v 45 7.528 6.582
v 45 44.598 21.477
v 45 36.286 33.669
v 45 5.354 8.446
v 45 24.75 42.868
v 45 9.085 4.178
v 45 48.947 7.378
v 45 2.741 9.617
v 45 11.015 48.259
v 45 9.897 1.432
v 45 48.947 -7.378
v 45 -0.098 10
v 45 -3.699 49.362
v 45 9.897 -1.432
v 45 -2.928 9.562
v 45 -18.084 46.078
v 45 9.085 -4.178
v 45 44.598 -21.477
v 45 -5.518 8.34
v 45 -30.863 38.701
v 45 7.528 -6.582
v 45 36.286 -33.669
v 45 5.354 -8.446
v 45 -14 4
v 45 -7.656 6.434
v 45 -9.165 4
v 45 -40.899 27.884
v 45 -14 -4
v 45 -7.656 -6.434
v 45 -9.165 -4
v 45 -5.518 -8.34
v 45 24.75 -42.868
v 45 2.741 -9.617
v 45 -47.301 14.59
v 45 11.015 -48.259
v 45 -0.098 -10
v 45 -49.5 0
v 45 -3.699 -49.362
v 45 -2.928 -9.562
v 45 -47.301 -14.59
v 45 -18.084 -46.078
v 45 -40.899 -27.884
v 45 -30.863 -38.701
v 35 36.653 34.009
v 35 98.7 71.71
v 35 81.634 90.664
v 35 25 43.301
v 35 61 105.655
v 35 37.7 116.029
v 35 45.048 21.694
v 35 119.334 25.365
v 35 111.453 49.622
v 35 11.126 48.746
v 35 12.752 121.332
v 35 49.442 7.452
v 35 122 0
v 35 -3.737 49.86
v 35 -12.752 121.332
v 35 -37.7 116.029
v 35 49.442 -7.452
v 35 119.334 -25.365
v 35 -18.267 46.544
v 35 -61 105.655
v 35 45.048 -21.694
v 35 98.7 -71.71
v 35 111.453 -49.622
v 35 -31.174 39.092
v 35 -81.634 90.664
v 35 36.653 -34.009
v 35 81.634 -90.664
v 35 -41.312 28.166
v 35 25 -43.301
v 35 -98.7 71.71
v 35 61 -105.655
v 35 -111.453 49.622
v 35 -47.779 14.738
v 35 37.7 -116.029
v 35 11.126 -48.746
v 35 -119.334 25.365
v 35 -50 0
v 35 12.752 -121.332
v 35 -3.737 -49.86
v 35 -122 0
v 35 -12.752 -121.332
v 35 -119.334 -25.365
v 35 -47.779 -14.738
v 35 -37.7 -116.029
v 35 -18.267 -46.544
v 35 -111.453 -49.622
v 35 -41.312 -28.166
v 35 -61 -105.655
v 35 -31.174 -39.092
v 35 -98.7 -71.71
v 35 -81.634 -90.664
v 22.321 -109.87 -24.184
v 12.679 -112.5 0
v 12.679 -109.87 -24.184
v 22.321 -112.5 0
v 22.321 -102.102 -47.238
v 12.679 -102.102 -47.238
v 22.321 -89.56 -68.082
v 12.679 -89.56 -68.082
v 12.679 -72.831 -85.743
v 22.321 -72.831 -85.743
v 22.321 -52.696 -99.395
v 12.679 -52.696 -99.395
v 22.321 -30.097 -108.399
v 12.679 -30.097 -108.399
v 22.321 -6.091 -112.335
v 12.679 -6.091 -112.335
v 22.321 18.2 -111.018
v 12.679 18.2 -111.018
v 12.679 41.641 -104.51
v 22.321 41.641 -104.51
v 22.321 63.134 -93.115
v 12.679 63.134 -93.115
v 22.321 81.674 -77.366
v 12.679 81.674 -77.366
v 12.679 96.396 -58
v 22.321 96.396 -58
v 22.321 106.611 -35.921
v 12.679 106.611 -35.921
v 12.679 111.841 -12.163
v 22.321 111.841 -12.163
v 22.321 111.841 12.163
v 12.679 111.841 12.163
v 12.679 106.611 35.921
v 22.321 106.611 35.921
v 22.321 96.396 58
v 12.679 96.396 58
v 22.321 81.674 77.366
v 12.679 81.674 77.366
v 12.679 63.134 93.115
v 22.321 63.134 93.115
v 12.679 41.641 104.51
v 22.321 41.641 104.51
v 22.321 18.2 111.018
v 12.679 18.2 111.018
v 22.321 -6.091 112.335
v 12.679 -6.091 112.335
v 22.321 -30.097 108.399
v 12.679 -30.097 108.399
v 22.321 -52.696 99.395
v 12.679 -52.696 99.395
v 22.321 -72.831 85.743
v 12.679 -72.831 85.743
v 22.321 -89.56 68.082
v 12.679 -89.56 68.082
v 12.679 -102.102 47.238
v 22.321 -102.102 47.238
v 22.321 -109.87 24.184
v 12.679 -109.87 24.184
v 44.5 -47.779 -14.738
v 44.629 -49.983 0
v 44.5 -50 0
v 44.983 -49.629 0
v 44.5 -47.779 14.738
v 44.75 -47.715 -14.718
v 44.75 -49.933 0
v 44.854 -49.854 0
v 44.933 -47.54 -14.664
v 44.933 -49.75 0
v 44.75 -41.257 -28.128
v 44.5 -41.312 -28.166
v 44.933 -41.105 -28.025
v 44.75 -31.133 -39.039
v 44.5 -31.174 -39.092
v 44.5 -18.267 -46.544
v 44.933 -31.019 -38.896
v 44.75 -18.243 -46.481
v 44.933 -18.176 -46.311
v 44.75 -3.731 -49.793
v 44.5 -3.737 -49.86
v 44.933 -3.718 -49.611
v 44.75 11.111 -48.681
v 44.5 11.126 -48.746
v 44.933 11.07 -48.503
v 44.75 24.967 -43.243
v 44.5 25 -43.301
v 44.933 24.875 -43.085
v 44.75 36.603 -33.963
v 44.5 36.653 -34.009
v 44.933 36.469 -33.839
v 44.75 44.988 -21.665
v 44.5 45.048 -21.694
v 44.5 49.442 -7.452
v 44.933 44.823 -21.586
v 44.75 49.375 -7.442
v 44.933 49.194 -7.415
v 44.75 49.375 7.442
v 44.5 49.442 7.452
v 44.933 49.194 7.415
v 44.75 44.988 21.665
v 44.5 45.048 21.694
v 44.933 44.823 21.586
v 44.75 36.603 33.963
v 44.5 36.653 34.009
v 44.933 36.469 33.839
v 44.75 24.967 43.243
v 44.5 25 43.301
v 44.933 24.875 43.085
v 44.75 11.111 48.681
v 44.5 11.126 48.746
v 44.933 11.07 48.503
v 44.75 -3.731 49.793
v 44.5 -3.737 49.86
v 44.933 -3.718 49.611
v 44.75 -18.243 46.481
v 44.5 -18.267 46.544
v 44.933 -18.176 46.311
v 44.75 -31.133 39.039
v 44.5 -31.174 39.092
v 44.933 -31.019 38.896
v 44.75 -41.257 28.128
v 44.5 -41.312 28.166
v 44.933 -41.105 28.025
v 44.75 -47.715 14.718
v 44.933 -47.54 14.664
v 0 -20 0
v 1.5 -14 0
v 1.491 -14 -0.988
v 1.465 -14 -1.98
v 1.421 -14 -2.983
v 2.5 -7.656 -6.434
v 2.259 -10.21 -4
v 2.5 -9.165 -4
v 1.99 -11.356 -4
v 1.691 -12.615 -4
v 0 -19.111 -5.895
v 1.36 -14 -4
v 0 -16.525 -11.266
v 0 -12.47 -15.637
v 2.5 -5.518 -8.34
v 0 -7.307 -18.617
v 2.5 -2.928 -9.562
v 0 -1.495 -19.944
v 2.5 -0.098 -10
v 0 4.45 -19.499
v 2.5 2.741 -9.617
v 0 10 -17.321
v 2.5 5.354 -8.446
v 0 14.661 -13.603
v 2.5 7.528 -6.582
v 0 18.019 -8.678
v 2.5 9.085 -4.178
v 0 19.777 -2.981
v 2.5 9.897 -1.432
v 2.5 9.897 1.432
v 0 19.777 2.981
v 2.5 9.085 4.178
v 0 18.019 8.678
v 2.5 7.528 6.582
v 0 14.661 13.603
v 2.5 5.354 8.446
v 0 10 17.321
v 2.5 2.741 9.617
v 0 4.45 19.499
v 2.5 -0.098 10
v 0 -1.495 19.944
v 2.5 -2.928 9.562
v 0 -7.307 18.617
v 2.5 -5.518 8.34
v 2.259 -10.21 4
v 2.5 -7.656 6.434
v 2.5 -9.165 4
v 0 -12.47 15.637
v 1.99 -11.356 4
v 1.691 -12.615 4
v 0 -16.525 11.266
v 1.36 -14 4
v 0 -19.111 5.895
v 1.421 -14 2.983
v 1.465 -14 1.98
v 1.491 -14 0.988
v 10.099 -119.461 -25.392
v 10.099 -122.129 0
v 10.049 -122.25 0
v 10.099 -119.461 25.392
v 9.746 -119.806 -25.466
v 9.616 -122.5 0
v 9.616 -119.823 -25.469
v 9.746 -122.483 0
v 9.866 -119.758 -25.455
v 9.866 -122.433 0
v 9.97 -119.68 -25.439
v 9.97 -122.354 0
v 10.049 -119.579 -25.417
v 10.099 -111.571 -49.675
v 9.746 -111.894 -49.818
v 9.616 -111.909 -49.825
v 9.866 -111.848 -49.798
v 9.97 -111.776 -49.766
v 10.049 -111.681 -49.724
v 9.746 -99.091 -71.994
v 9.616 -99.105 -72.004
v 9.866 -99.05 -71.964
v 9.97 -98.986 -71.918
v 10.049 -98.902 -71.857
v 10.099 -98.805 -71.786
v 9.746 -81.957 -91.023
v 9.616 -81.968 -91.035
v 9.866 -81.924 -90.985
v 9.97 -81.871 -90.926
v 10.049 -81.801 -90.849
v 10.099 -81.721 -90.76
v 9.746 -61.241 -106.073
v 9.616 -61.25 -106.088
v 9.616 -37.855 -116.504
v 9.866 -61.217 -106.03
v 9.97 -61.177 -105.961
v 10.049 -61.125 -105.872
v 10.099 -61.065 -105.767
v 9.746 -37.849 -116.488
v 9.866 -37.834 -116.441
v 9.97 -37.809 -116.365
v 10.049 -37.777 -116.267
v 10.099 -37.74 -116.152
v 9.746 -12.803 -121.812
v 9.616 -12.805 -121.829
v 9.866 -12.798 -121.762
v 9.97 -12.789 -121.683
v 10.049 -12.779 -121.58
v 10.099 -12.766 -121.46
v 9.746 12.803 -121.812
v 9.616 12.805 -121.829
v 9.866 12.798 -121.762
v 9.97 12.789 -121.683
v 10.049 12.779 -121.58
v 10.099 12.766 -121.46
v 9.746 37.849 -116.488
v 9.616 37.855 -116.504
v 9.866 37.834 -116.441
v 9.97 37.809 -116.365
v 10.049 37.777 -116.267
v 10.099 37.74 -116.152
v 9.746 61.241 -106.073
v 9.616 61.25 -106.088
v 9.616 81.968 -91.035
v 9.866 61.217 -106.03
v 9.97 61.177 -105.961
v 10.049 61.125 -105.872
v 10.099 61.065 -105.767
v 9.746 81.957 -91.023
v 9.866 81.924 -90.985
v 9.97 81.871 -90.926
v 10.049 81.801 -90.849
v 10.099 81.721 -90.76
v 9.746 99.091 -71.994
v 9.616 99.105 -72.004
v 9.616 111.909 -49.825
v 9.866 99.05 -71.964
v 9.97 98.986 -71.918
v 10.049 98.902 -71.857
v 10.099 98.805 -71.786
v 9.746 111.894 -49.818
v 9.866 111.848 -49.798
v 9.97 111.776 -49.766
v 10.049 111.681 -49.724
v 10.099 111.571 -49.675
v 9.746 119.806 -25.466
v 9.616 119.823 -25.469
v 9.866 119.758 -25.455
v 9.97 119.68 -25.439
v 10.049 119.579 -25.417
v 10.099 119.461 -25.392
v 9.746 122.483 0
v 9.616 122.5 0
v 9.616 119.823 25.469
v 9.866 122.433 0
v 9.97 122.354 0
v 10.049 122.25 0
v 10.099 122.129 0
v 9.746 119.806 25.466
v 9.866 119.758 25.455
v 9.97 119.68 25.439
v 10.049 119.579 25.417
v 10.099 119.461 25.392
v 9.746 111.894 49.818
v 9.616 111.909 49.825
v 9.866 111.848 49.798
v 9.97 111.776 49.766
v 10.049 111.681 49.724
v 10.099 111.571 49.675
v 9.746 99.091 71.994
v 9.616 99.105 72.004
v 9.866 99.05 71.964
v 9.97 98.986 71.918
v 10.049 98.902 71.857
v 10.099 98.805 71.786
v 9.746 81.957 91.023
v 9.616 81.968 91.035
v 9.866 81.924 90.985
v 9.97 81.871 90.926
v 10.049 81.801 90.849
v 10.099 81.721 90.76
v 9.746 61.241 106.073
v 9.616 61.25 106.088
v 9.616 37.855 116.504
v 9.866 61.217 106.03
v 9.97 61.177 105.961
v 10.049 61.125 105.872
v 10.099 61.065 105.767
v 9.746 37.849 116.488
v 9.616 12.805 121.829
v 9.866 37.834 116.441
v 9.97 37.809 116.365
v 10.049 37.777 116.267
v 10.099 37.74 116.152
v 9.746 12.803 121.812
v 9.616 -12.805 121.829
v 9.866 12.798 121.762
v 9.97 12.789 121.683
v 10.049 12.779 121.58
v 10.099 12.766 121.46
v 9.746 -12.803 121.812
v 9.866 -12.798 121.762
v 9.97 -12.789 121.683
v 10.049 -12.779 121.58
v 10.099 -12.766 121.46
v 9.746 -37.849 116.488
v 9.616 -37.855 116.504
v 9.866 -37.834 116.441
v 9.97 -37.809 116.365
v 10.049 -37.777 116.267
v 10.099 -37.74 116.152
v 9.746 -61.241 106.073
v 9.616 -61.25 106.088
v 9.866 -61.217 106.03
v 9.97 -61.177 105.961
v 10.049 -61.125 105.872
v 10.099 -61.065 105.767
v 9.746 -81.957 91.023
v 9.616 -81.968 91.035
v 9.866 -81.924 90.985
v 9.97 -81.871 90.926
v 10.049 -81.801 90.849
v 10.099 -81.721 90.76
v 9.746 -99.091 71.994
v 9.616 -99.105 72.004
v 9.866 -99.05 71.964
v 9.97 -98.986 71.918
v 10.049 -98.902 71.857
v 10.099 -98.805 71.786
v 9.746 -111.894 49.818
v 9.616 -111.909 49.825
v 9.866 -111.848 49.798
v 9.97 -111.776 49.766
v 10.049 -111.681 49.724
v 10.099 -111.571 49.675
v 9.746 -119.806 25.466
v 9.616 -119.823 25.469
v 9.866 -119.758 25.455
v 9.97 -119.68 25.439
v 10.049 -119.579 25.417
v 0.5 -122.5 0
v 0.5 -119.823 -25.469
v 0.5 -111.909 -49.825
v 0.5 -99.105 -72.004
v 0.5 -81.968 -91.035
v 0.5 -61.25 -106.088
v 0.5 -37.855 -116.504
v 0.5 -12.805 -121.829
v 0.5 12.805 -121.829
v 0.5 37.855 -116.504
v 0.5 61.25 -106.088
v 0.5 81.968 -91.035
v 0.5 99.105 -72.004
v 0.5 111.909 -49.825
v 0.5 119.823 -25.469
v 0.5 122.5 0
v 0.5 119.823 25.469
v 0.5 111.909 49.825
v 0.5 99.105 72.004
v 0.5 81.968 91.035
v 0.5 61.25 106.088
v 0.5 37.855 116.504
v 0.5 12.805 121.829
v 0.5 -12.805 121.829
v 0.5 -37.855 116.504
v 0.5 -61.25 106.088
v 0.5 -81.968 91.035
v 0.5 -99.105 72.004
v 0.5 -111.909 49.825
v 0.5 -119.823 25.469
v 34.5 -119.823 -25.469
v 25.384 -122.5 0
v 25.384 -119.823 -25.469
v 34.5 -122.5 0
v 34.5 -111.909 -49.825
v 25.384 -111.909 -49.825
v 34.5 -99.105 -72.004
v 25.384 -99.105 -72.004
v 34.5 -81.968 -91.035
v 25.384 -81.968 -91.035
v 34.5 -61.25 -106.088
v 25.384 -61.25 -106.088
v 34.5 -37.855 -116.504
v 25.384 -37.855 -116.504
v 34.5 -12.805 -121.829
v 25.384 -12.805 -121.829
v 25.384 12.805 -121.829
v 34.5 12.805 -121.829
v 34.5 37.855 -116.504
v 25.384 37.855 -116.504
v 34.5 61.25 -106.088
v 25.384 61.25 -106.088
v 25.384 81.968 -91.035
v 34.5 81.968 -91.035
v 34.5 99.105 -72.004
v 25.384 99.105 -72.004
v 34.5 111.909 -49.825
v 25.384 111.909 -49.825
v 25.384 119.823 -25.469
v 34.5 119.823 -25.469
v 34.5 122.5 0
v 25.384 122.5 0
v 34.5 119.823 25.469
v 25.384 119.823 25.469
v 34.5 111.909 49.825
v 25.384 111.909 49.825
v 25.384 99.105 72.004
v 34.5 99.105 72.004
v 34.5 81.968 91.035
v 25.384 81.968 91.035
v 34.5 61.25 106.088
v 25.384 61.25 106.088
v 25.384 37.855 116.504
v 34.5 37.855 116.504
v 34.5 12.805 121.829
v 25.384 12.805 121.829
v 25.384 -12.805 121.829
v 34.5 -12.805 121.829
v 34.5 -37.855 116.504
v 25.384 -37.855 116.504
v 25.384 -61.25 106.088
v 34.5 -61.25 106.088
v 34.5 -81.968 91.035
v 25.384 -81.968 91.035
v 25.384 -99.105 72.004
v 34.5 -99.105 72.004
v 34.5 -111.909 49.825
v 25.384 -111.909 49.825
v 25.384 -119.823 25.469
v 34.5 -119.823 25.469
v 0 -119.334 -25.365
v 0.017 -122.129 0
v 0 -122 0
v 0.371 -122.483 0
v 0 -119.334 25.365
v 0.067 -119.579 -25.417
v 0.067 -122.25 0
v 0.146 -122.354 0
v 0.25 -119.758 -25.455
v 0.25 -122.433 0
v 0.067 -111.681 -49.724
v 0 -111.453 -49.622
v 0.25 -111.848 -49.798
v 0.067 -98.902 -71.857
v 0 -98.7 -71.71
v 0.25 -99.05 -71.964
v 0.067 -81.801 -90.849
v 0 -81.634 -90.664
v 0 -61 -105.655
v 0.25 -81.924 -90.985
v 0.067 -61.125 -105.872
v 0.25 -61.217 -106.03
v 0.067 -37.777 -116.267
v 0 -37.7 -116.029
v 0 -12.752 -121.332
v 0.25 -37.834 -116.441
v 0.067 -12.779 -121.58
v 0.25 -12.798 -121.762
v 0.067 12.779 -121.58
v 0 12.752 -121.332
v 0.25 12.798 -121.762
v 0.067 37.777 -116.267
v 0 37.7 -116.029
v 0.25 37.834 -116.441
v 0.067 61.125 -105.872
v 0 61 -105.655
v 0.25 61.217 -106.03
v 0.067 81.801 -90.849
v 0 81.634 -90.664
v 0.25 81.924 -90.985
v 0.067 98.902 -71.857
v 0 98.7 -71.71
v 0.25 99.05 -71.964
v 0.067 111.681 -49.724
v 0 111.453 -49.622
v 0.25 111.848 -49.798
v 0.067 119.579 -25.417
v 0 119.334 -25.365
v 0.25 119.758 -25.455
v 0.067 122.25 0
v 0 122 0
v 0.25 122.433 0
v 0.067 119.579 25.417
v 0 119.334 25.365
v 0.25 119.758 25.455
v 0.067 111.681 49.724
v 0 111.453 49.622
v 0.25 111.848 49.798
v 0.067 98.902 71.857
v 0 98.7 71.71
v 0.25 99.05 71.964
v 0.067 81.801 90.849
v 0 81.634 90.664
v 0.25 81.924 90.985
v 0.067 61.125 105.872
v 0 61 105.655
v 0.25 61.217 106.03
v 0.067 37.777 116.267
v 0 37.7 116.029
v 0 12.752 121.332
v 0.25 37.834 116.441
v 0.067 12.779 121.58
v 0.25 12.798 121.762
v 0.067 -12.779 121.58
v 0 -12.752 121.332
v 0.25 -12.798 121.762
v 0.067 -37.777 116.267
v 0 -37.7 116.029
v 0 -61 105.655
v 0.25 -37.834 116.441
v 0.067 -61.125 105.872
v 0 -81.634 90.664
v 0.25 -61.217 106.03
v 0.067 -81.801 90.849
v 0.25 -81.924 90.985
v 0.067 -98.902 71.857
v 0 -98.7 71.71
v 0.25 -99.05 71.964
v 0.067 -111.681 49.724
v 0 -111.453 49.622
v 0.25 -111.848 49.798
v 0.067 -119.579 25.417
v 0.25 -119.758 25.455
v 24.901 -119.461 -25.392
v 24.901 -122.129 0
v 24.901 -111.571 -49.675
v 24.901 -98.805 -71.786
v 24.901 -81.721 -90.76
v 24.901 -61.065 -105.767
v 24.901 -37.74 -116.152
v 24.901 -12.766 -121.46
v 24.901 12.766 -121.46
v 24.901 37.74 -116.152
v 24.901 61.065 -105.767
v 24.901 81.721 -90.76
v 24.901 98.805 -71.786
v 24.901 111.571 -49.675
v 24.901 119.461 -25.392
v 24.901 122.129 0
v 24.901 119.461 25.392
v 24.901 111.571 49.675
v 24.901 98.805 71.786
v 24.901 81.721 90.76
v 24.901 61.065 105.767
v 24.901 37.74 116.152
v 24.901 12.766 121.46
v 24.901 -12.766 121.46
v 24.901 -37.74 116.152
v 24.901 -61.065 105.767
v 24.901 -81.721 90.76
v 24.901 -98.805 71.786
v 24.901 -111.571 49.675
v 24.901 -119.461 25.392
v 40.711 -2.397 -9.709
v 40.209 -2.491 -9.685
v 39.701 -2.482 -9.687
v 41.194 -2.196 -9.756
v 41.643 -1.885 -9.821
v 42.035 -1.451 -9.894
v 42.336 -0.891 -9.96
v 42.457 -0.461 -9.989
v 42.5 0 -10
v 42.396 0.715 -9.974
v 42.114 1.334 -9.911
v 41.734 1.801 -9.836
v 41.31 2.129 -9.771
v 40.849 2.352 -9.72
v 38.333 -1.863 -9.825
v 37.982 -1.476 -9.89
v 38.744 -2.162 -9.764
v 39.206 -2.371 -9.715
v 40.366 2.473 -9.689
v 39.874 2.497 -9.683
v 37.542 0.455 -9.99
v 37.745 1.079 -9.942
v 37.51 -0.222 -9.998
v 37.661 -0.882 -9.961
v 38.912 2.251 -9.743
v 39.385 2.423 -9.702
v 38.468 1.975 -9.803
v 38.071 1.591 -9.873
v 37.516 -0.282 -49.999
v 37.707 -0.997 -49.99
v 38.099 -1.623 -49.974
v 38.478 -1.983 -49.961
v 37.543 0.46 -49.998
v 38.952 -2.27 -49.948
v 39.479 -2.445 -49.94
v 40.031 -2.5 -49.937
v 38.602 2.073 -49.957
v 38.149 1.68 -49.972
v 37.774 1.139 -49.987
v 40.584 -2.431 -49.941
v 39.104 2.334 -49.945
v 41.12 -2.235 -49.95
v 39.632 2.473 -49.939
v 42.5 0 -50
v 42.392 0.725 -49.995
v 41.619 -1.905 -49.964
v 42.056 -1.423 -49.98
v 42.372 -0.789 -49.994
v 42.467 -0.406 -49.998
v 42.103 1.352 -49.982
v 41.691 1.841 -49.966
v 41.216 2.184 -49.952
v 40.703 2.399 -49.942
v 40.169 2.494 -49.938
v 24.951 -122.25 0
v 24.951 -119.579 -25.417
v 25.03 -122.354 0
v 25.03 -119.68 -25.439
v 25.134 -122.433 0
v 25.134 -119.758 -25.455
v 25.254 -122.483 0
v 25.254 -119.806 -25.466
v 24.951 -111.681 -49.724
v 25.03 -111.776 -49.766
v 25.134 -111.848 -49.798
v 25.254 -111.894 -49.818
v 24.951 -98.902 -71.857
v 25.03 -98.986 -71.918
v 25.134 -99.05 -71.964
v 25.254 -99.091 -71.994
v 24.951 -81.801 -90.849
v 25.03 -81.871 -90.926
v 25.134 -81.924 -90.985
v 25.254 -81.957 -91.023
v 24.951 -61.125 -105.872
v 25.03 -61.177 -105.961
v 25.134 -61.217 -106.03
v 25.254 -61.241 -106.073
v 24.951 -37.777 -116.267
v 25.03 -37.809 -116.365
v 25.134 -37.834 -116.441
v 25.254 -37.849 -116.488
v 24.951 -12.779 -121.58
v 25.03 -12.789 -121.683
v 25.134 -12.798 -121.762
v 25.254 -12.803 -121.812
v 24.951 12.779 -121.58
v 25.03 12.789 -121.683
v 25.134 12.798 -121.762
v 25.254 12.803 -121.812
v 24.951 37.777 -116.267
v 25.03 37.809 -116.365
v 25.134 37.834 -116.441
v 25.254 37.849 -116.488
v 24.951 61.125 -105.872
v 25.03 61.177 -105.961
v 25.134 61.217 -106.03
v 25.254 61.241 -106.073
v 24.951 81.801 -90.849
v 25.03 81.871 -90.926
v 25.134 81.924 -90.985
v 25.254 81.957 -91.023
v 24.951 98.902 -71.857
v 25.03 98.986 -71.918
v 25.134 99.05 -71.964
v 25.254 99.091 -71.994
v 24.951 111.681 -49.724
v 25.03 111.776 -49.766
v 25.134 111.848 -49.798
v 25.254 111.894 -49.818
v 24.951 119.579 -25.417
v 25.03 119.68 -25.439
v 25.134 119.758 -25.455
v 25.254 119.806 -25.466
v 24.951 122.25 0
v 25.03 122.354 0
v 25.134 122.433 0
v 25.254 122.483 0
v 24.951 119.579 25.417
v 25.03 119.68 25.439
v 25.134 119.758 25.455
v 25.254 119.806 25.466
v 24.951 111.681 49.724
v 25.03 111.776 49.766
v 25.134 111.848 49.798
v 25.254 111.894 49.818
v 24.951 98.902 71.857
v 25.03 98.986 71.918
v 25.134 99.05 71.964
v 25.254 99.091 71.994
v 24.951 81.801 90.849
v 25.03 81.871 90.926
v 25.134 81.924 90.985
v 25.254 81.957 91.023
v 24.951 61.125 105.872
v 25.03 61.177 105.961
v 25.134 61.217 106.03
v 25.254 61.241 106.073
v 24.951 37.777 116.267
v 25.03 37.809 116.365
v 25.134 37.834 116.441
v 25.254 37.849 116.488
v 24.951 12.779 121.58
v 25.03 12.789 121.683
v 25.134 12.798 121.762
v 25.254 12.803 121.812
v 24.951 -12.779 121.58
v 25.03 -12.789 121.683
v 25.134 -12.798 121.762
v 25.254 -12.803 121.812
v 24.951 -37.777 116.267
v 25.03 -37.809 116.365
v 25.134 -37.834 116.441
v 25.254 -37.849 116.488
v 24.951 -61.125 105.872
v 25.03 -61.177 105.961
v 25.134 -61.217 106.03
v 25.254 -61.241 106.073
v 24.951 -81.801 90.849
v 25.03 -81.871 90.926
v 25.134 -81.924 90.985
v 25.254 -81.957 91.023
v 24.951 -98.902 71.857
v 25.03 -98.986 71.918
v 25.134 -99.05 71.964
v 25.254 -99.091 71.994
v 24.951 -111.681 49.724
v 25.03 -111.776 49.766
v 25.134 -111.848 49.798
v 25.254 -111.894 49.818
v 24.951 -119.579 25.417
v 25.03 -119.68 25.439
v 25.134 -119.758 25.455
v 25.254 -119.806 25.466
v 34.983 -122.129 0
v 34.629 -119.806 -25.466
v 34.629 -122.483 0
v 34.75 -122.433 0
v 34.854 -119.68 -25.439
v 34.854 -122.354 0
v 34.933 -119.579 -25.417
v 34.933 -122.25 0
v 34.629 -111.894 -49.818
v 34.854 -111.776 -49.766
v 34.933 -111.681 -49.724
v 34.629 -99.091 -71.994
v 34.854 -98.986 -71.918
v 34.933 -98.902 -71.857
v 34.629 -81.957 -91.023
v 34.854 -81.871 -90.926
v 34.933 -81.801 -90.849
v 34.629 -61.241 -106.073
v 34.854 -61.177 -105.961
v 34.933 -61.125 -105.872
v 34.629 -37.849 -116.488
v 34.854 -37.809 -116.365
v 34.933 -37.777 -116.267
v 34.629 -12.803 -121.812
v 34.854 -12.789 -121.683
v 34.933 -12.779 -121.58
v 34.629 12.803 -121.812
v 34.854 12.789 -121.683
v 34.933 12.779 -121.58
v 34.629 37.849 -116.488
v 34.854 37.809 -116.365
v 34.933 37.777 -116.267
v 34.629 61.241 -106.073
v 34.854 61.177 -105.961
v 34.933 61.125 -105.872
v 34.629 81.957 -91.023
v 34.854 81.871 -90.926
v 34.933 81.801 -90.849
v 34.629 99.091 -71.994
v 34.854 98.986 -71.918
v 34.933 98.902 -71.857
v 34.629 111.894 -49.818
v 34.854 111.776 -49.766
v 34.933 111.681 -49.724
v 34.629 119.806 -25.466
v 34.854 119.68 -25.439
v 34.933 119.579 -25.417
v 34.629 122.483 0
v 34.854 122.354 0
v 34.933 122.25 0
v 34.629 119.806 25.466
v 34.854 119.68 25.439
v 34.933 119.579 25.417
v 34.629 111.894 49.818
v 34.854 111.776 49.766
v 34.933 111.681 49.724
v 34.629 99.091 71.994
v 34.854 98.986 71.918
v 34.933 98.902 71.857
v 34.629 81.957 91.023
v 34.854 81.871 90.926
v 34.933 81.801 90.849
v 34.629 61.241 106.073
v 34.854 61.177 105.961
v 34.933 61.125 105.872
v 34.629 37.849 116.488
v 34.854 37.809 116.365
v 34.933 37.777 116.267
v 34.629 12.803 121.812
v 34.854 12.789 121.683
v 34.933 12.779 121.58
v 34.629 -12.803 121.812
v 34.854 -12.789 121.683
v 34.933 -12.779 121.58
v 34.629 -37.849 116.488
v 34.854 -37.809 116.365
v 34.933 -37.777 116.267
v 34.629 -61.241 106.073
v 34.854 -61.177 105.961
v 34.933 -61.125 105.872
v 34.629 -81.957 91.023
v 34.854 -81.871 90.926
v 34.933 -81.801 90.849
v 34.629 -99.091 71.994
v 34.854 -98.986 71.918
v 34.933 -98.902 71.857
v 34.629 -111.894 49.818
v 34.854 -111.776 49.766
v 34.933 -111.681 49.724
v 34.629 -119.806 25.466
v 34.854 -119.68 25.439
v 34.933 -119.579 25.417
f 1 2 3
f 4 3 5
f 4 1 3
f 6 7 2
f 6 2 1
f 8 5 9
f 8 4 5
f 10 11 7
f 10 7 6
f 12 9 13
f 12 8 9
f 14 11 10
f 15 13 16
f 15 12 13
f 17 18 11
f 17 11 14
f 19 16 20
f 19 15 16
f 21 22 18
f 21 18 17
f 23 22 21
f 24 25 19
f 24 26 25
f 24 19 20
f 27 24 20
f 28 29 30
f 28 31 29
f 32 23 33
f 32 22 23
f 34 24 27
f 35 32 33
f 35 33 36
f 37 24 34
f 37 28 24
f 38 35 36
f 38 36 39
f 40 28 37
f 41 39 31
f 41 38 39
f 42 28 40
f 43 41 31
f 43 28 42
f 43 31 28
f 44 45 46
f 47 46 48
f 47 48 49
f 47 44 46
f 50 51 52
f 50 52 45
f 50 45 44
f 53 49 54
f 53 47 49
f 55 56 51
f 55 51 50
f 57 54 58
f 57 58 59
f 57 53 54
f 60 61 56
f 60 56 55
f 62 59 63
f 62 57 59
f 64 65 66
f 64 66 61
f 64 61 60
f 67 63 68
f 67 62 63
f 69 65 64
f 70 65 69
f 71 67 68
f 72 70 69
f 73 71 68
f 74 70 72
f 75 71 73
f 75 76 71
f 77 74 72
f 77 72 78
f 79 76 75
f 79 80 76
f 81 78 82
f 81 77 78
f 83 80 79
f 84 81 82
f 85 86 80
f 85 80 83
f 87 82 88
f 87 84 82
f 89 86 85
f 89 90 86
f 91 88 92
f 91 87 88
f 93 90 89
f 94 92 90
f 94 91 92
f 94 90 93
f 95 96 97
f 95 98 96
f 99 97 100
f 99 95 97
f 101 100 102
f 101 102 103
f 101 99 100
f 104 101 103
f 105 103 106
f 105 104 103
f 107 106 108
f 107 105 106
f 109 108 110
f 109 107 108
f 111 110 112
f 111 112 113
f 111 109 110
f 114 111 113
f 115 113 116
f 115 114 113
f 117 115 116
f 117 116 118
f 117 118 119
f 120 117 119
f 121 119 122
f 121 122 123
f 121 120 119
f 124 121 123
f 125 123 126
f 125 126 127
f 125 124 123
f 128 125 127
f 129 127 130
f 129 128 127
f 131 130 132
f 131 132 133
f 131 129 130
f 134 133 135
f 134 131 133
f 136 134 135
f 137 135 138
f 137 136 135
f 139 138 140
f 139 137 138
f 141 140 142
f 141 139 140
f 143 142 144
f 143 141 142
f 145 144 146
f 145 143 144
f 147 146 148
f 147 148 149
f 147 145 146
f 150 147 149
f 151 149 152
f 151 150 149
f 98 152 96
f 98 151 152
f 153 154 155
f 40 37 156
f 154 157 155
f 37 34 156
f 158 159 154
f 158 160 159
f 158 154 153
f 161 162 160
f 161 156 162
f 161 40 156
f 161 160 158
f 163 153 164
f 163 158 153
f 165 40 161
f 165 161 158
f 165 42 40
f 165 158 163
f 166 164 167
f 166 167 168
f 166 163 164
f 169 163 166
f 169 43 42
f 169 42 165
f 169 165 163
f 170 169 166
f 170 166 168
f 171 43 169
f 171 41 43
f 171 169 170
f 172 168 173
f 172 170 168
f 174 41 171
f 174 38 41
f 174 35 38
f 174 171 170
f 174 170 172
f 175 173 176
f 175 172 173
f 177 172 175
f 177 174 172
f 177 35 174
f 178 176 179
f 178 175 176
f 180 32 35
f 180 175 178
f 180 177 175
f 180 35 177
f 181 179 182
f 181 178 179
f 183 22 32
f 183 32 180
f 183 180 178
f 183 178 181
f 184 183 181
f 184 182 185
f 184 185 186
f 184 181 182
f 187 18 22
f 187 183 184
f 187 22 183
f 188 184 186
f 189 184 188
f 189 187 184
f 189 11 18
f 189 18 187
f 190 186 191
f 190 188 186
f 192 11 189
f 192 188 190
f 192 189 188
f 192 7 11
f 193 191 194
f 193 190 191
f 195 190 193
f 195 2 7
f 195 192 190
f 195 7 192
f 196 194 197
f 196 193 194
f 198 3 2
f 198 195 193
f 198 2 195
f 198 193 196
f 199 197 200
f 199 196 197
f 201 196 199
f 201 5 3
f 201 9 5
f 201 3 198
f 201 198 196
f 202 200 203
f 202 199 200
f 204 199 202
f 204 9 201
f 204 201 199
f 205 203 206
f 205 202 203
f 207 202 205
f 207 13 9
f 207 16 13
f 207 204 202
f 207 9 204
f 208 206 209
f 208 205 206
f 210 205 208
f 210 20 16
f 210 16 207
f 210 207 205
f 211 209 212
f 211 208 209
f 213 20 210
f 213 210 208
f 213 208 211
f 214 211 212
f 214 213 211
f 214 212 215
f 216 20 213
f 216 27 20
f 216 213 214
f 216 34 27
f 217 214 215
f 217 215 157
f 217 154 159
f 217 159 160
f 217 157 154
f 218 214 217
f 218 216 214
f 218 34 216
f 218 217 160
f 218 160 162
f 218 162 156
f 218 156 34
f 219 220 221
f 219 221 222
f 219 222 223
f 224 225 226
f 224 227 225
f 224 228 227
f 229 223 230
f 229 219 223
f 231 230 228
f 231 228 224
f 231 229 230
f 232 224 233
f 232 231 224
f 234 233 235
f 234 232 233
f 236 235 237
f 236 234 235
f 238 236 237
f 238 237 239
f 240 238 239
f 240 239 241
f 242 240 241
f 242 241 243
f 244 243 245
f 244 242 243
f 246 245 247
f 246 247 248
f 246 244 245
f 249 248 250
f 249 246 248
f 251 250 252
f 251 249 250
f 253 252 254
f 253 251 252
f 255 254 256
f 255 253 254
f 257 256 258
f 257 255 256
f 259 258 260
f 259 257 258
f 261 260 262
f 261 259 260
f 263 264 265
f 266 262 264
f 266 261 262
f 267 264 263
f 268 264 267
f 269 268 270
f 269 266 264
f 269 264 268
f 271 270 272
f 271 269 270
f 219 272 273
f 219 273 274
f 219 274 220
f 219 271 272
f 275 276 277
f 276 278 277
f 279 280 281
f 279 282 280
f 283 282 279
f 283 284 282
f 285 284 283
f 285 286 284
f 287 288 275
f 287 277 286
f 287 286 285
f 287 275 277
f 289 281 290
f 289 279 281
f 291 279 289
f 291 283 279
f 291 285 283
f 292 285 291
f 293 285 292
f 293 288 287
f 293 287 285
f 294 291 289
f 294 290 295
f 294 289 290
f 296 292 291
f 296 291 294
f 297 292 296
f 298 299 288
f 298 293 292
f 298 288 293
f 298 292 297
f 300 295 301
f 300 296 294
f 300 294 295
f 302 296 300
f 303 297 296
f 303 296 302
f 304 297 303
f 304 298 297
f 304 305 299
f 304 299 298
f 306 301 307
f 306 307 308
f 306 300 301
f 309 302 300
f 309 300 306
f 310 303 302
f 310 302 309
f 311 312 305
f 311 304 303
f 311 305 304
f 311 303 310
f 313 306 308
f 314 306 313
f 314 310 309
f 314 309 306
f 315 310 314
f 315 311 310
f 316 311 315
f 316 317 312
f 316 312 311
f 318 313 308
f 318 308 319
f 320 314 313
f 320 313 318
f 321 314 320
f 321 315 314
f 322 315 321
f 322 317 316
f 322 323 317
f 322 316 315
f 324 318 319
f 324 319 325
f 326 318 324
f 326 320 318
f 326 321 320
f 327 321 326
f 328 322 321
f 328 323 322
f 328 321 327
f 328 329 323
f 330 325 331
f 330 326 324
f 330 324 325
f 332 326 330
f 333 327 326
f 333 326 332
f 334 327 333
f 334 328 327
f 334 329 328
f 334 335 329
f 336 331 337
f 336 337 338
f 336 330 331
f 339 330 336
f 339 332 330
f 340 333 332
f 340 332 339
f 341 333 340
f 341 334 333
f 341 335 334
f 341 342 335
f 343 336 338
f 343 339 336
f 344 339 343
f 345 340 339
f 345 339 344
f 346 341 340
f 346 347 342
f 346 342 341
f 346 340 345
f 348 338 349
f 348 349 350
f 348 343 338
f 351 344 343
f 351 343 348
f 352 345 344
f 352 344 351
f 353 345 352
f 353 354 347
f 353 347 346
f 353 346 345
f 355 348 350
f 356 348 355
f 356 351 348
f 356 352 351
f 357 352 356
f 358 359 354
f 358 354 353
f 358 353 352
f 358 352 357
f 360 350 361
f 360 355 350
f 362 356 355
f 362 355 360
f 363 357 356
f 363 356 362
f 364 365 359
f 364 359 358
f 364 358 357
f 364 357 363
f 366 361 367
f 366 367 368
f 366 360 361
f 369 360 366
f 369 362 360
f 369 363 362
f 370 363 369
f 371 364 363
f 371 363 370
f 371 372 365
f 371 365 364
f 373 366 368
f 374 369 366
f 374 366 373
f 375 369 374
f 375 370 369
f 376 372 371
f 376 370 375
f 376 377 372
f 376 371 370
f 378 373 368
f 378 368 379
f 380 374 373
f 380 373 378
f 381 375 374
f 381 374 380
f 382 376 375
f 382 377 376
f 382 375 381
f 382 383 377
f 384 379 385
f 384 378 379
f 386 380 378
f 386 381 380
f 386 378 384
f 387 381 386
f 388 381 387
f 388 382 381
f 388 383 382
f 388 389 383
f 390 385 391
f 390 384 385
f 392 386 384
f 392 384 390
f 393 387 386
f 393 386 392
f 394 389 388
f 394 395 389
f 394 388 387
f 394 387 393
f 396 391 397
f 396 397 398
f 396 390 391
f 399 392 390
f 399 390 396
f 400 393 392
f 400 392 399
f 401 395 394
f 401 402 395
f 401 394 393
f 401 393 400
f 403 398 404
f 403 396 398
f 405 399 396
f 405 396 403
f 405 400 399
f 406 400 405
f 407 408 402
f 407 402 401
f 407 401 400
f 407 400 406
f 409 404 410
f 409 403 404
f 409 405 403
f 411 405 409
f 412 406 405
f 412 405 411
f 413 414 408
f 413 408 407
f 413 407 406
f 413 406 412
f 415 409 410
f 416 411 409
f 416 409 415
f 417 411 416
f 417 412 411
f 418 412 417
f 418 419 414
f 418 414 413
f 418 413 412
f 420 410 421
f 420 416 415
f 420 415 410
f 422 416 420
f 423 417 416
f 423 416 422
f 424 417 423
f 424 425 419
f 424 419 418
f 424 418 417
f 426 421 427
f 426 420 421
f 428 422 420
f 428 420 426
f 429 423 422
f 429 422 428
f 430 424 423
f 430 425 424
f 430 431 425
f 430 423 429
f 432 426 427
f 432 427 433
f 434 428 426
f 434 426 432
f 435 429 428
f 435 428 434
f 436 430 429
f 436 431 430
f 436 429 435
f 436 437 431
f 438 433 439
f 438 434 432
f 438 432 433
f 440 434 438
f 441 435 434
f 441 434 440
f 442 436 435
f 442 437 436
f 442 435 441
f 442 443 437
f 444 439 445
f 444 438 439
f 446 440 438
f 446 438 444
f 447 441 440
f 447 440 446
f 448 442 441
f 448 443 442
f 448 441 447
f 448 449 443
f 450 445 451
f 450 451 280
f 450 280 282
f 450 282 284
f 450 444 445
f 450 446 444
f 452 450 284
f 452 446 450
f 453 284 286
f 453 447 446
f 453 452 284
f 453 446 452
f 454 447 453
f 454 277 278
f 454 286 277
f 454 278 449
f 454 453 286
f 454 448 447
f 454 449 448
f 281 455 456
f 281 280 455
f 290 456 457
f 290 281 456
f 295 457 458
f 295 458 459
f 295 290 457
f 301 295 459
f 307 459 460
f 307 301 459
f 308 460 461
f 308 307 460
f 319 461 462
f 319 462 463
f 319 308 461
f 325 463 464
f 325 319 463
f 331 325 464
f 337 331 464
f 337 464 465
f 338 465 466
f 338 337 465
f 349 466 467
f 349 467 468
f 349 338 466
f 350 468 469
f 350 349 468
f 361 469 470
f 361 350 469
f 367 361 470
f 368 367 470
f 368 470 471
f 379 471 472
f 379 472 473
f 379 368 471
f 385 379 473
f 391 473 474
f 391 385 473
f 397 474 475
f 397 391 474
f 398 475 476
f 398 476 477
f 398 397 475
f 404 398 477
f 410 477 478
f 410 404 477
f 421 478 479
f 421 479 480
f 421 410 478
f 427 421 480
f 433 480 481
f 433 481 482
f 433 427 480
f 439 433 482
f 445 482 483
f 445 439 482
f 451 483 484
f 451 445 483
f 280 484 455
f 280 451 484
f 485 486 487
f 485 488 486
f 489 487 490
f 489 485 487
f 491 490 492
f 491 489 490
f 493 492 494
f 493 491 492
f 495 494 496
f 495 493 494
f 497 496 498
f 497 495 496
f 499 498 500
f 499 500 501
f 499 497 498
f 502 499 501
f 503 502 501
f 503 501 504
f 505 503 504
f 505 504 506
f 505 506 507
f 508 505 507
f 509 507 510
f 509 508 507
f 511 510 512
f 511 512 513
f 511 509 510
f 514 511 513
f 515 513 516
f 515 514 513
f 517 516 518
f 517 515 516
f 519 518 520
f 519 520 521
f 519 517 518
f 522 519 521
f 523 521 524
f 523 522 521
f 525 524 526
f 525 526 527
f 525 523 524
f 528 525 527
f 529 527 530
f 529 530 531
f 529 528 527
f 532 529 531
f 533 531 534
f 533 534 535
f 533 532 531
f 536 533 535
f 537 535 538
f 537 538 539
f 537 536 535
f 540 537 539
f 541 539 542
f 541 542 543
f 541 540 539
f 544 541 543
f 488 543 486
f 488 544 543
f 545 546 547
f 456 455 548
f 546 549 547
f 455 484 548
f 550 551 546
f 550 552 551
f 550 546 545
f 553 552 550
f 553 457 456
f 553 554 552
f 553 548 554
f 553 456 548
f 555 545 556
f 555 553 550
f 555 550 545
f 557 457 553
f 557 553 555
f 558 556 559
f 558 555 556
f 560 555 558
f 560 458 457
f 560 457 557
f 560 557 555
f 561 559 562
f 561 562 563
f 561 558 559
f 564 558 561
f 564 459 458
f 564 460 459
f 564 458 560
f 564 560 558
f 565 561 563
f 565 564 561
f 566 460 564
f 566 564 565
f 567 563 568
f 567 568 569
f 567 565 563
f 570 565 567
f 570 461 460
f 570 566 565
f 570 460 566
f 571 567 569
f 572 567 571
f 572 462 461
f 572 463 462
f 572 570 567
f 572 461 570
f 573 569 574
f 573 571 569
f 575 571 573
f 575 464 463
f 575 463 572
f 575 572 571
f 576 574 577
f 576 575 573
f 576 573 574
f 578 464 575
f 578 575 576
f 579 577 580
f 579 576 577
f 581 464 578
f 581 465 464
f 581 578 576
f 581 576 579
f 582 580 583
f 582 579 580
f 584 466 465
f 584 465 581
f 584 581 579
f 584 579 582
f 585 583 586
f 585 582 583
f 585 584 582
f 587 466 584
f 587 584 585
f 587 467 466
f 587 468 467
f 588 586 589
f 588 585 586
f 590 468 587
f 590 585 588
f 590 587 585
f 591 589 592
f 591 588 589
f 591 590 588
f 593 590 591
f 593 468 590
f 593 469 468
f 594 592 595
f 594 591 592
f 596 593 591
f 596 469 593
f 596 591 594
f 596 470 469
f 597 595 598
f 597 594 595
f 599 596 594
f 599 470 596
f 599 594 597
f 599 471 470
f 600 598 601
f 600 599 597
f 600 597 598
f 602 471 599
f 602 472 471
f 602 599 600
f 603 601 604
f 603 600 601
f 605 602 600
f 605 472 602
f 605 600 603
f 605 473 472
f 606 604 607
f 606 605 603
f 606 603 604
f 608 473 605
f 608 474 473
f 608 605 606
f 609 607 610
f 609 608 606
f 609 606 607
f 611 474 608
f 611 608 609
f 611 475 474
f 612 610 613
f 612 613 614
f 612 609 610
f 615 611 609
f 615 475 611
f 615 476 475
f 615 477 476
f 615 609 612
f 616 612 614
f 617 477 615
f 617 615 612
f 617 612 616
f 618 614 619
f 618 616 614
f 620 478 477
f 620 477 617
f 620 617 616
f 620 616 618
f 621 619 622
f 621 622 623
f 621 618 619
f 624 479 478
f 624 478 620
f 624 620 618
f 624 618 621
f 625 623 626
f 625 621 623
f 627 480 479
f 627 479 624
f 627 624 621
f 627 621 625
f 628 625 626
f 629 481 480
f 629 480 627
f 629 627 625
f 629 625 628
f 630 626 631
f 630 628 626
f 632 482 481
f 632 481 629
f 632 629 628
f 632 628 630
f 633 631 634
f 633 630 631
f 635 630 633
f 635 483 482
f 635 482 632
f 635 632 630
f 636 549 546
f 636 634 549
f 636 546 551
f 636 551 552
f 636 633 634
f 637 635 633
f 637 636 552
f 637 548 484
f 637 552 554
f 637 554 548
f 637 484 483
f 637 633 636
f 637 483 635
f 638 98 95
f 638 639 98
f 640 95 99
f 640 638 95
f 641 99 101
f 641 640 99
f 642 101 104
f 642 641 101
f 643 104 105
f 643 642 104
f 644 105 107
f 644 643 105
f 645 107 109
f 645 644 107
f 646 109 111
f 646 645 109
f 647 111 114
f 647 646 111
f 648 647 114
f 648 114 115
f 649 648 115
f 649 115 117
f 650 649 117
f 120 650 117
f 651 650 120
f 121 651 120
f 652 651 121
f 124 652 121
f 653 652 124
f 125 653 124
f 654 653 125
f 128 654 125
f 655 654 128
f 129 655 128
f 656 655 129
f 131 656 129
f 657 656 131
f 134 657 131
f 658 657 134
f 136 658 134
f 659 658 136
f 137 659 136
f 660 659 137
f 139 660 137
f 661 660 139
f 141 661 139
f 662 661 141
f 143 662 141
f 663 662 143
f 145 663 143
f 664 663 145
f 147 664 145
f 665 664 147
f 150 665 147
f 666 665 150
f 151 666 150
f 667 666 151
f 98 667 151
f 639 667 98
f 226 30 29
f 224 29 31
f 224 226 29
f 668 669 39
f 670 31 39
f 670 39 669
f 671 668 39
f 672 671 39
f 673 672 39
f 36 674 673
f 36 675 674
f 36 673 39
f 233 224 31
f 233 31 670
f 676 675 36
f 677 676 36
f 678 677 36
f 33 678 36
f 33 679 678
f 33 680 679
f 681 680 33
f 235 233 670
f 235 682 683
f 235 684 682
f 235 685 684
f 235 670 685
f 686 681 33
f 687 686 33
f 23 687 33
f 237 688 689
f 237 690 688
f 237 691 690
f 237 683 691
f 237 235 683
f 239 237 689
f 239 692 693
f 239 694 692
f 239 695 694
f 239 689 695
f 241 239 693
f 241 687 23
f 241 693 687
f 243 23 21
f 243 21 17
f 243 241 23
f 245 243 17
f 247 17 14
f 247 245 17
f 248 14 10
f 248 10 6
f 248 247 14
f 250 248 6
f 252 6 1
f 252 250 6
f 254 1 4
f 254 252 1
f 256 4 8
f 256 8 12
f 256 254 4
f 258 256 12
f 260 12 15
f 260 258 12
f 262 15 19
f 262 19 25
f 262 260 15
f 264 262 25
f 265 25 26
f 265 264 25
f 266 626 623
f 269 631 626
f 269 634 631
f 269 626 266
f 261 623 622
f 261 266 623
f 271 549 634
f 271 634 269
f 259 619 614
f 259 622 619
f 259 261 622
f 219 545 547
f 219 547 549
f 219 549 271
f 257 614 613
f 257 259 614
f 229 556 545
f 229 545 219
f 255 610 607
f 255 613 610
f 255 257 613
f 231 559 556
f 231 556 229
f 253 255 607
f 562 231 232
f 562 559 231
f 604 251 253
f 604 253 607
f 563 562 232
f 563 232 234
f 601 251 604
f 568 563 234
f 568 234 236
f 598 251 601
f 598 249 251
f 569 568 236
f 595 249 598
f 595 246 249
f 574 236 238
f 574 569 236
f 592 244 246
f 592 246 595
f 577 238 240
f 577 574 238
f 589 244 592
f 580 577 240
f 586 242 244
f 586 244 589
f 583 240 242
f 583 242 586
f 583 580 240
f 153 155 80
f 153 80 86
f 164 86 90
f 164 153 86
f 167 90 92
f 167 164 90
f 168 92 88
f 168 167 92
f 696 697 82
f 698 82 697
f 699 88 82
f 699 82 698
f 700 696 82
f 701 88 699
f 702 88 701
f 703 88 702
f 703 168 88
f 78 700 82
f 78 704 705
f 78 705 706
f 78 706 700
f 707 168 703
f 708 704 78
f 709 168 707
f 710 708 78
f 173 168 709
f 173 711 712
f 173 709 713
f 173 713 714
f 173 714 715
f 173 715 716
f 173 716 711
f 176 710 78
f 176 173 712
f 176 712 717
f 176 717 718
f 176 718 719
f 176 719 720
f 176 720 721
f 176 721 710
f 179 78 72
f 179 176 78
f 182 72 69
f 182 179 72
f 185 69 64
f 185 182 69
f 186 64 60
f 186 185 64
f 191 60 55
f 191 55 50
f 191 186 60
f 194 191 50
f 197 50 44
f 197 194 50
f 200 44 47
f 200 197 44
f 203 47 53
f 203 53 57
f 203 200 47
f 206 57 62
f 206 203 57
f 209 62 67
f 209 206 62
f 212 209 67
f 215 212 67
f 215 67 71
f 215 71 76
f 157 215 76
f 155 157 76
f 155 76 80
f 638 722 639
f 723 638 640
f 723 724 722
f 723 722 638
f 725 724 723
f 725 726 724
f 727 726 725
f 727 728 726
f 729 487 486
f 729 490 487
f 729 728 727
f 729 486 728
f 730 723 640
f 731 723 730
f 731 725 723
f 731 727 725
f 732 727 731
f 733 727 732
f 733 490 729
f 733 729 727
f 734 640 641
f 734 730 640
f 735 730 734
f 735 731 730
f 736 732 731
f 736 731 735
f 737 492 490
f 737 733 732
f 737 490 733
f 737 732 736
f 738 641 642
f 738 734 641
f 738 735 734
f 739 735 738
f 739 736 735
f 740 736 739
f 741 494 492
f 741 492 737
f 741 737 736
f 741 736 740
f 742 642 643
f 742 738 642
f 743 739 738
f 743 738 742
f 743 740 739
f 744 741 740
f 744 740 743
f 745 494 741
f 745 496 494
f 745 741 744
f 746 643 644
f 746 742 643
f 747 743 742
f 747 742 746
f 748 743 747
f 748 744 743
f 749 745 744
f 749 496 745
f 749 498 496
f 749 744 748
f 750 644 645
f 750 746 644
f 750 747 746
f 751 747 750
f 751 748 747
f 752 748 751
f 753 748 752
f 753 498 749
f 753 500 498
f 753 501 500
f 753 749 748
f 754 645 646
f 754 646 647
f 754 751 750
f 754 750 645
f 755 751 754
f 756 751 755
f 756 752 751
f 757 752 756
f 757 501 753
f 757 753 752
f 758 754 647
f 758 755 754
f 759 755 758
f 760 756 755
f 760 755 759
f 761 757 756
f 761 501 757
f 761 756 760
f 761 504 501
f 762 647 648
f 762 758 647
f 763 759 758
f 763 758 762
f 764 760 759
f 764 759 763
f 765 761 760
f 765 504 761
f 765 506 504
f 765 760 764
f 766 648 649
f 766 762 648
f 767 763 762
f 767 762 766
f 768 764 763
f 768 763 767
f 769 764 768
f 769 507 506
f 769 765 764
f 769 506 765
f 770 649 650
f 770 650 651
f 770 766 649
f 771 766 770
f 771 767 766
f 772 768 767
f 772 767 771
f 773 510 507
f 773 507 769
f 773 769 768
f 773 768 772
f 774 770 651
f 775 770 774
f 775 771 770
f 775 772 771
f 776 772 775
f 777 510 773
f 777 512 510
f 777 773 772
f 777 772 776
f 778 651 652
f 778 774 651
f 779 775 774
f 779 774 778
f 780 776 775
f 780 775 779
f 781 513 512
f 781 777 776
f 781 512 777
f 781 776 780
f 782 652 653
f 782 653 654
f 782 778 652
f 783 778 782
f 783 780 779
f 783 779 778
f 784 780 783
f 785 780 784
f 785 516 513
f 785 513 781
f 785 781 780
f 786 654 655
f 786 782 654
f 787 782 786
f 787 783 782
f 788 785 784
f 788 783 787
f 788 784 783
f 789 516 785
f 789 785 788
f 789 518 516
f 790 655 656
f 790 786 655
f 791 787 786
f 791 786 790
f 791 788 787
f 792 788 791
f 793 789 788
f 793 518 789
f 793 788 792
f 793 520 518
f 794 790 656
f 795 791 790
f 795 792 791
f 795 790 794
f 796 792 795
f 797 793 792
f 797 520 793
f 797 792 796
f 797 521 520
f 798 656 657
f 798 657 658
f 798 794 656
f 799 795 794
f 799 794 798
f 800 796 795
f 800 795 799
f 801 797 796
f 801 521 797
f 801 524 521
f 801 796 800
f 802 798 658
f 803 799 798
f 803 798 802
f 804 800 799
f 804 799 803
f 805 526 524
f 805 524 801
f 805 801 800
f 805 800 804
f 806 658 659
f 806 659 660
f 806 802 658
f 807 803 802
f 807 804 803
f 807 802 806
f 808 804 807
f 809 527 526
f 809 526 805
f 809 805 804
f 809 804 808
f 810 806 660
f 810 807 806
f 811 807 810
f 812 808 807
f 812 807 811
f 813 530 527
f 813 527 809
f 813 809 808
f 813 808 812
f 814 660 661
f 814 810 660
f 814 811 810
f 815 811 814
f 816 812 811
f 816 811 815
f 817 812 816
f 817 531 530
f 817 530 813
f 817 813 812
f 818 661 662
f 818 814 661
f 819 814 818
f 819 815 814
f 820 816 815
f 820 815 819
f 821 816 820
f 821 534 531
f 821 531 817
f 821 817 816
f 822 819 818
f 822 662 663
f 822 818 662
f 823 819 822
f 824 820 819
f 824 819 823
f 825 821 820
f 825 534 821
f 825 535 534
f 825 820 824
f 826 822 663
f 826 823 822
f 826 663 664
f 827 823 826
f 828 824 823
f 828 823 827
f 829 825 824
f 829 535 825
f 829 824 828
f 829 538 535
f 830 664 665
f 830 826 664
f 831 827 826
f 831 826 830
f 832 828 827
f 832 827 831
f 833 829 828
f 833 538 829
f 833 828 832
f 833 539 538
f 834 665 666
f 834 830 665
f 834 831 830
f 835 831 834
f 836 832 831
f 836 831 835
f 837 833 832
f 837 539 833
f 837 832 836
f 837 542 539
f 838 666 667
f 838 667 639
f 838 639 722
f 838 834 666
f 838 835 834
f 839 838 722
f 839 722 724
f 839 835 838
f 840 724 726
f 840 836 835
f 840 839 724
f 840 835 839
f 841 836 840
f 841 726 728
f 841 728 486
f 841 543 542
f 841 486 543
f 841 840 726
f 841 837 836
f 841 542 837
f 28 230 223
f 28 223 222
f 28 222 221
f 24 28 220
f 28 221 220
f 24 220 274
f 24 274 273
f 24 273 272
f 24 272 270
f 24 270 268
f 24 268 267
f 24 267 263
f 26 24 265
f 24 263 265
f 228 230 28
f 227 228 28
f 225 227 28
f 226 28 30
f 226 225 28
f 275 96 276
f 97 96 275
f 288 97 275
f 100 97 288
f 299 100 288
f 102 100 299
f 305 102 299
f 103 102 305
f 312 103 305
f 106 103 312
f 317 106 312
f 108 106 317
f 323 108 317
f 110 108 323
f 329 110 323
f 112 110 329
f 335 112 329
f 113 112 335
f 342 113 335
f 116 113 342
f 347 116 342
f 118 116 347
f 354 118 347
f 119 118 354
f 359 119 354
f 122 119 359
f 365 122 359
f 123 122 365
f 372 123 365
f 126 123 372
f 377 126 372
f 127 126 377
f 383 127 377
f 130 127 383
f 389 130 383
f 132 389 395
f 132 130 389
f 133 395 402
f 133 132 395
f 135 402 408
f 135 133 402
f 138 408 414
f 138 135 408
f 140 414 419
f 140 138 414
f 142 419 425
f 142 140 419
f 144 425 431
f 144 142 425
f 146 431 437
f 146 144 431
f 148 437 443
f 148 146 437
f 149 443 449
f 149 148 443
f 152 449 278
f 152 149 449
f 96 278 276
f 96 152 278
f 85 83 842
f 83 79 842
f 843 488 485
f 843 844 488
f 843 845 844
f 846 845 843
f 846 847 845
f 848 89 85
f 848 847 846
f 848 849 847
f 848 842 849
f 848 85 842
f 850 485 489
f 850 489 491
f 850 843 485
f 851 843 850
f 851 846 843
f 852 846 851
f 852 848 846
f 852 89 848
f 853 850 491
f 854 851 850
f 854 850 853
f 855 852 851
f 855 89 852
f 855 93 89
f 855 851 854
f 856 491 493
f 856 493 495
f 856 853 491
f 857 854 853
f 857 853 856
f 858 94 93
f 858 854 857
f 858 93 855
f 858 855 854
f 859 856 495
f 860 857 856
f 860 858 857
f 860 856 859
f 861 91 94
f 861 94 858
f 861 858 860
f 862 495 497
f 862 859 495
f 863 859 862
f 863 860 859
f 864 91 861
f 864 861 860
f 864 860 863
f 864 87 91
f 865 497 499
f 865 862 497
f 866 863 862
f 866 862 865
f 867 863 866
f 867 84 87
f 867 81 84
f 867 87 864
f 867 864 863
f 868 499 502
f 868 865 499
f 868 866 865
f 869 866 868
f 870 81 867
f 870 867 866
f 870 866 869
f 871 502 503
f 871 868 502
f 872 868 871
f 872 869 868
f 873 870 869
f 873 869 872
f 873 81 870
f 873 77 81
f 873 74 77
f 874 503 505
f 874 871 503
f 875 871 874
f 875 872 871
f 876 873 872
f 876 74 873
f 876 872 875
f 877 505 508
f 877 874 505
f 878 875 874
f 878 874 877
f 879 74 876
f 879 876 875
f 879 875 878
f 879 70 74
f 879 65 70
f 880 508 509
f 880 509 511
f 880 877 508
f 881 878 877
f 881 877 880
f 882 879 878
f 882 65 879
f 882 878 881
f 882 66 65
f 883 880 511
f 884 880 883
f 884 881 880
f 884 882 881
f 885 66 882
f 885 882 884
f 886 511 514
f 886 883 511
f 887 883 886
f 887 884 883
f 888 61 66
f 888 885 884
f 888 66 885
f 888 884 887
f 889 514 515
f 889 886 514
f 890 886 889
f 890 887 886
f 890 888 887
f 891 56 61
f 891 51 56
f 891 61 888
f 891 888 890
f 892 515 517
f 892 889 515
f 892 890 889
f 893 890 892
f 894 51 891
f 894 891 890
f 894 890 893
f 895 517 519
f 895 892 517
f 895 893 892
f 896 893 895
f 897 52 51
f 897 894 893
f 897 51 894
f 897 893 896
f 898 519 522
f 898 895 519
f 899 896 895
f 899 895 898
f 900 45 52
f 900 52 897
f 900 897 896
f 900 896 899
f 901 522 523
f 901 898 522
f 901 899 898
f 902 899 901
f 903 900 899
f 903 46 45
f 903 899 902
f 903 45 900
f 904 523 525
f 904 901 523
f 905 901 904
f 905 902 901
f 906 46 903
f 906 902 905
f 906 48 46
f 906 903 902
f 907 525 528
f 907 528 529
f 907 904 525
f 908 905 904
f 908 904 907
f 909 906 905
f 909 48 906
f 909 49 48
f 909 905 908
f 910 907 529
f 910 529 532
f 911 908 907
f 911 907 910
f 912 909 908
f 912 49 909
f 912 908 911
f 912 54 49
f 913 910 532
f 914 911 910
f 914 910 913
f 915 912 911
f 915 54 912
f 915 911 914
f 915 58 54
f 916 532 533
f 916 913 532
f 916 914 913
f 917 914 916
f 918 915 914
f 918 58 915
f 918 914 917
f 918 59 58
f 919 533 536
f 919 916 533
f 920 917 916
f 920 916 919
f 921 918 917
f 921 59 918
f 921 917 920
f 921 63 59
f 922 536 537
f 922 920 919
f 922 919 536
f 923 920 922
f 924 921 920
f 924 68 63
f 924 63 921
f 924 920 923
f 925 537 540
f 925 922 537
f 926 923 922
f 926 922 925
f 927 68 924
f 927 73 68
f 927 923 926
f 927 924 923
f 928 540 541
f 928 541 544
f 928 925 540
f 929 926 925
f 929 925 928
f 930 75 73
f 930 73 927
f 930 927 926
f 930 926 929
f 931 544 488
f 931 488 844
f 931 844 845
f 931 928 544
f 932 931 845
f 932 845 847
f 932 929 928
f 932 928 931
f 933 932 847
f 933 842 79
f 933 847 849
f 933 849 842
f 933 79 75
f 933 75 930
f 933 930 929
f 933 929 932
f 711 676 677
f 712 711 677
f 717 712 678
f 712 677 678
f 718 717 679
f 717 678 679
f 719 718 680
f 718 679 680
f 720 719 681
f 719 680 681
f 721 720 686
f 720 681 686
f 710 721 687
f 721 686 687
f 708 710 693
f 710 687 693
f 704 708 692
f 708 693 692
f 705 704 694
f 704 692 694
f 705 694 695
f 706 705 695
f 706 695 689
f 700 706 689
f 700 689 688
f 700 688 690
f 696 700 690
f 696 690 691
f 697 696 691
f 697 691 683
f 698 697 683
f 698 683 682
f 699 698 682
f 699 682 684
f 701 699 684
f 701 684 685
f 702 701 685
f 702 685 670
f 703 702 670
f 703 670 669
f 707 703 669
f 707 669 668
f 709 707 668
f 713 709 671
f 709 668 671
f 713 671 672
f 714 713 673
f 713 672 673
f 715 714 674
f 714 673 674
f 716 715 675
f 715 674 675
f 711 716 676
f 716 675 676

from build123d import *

# Parameters (mm, degrees)
ESBO_O1_W             = 8
ESBO_O1_H             = 8
CORTE_EXTRUS_O1_DEPTH = 46
ESBO_O3_R             = 2.5
CORTE_EXTRUS_O2_DEPTH = 123.5


with BuildPart() as part:
    # Sketch1 → Revolve1 (revolve)
    with BuildSketch(Plane.XY):
        with BuildLine():
            Line((0, -20), (0, -122))
            ThreePointArc((0, -122), (0.146446609, -122.353553391), (0.5, -122.5))
            Line((0.5, -122.5), (9.616336506, -122.5))
            ThreePointArc((9.616336506, -122.5), (9.920717221, -122.39667667), (10.099299419, -122.129409523))
            Line((10.099299419, -122.129409523), (12.679491924, -112.5))
            Line((12.679491924, -112.5), (22.320508076, -112.5))
            Line((22.320508076, -112.5), (24.900700581, -122.129409523))
            ThreePointArc((24.900700581, -122.129409523), (25.079282779, -122.39667667), (25.383663494, -122.5))
            Line((25.383663494, -122.5), (34.5, -122.5))
            ThreePointArc((34.5, -122.5), (34.853553391, -122.353553391), (35, -122))
            Line((35, -122), (35, -50))
            Line((35, -50), (44.5, -50))
            ThreePointArc((44.5, -50), (44.853553391, -49.853553391), (45, -49.5))
            Line((45, -49.5), (45, -10))
            Line((45, -10), (2.5, -10))
            Line((2.5, -10), (0, -20))
        make_face()
    revolve(axis=Axis((0, 0, 0), (1, 0, 0)))

    # Esboço1 → Corte-extrusão1 (cut, through all)
    with BuildSketch(Plane.ZY):
        with Locations((0, -10)):
            Rectangle(ESBO_O1_W, ESBO_O1_H)
    extrude(amount=-CORTE_EXTRUS_O1_DEPTH, mode=Mode.SUBTRACT)

    # Esboço3 → Corte-extrusão2 (cut, through all)
    with BuildSketch(Plane.XY):
        with Locations((40, 0)):
            Circle(ESBO_O3_R)
    extrude(amount=-CORTE_EXTRUS_O2_DEPTH, mode=Mode.SUBTRACT)


solid = part.part
